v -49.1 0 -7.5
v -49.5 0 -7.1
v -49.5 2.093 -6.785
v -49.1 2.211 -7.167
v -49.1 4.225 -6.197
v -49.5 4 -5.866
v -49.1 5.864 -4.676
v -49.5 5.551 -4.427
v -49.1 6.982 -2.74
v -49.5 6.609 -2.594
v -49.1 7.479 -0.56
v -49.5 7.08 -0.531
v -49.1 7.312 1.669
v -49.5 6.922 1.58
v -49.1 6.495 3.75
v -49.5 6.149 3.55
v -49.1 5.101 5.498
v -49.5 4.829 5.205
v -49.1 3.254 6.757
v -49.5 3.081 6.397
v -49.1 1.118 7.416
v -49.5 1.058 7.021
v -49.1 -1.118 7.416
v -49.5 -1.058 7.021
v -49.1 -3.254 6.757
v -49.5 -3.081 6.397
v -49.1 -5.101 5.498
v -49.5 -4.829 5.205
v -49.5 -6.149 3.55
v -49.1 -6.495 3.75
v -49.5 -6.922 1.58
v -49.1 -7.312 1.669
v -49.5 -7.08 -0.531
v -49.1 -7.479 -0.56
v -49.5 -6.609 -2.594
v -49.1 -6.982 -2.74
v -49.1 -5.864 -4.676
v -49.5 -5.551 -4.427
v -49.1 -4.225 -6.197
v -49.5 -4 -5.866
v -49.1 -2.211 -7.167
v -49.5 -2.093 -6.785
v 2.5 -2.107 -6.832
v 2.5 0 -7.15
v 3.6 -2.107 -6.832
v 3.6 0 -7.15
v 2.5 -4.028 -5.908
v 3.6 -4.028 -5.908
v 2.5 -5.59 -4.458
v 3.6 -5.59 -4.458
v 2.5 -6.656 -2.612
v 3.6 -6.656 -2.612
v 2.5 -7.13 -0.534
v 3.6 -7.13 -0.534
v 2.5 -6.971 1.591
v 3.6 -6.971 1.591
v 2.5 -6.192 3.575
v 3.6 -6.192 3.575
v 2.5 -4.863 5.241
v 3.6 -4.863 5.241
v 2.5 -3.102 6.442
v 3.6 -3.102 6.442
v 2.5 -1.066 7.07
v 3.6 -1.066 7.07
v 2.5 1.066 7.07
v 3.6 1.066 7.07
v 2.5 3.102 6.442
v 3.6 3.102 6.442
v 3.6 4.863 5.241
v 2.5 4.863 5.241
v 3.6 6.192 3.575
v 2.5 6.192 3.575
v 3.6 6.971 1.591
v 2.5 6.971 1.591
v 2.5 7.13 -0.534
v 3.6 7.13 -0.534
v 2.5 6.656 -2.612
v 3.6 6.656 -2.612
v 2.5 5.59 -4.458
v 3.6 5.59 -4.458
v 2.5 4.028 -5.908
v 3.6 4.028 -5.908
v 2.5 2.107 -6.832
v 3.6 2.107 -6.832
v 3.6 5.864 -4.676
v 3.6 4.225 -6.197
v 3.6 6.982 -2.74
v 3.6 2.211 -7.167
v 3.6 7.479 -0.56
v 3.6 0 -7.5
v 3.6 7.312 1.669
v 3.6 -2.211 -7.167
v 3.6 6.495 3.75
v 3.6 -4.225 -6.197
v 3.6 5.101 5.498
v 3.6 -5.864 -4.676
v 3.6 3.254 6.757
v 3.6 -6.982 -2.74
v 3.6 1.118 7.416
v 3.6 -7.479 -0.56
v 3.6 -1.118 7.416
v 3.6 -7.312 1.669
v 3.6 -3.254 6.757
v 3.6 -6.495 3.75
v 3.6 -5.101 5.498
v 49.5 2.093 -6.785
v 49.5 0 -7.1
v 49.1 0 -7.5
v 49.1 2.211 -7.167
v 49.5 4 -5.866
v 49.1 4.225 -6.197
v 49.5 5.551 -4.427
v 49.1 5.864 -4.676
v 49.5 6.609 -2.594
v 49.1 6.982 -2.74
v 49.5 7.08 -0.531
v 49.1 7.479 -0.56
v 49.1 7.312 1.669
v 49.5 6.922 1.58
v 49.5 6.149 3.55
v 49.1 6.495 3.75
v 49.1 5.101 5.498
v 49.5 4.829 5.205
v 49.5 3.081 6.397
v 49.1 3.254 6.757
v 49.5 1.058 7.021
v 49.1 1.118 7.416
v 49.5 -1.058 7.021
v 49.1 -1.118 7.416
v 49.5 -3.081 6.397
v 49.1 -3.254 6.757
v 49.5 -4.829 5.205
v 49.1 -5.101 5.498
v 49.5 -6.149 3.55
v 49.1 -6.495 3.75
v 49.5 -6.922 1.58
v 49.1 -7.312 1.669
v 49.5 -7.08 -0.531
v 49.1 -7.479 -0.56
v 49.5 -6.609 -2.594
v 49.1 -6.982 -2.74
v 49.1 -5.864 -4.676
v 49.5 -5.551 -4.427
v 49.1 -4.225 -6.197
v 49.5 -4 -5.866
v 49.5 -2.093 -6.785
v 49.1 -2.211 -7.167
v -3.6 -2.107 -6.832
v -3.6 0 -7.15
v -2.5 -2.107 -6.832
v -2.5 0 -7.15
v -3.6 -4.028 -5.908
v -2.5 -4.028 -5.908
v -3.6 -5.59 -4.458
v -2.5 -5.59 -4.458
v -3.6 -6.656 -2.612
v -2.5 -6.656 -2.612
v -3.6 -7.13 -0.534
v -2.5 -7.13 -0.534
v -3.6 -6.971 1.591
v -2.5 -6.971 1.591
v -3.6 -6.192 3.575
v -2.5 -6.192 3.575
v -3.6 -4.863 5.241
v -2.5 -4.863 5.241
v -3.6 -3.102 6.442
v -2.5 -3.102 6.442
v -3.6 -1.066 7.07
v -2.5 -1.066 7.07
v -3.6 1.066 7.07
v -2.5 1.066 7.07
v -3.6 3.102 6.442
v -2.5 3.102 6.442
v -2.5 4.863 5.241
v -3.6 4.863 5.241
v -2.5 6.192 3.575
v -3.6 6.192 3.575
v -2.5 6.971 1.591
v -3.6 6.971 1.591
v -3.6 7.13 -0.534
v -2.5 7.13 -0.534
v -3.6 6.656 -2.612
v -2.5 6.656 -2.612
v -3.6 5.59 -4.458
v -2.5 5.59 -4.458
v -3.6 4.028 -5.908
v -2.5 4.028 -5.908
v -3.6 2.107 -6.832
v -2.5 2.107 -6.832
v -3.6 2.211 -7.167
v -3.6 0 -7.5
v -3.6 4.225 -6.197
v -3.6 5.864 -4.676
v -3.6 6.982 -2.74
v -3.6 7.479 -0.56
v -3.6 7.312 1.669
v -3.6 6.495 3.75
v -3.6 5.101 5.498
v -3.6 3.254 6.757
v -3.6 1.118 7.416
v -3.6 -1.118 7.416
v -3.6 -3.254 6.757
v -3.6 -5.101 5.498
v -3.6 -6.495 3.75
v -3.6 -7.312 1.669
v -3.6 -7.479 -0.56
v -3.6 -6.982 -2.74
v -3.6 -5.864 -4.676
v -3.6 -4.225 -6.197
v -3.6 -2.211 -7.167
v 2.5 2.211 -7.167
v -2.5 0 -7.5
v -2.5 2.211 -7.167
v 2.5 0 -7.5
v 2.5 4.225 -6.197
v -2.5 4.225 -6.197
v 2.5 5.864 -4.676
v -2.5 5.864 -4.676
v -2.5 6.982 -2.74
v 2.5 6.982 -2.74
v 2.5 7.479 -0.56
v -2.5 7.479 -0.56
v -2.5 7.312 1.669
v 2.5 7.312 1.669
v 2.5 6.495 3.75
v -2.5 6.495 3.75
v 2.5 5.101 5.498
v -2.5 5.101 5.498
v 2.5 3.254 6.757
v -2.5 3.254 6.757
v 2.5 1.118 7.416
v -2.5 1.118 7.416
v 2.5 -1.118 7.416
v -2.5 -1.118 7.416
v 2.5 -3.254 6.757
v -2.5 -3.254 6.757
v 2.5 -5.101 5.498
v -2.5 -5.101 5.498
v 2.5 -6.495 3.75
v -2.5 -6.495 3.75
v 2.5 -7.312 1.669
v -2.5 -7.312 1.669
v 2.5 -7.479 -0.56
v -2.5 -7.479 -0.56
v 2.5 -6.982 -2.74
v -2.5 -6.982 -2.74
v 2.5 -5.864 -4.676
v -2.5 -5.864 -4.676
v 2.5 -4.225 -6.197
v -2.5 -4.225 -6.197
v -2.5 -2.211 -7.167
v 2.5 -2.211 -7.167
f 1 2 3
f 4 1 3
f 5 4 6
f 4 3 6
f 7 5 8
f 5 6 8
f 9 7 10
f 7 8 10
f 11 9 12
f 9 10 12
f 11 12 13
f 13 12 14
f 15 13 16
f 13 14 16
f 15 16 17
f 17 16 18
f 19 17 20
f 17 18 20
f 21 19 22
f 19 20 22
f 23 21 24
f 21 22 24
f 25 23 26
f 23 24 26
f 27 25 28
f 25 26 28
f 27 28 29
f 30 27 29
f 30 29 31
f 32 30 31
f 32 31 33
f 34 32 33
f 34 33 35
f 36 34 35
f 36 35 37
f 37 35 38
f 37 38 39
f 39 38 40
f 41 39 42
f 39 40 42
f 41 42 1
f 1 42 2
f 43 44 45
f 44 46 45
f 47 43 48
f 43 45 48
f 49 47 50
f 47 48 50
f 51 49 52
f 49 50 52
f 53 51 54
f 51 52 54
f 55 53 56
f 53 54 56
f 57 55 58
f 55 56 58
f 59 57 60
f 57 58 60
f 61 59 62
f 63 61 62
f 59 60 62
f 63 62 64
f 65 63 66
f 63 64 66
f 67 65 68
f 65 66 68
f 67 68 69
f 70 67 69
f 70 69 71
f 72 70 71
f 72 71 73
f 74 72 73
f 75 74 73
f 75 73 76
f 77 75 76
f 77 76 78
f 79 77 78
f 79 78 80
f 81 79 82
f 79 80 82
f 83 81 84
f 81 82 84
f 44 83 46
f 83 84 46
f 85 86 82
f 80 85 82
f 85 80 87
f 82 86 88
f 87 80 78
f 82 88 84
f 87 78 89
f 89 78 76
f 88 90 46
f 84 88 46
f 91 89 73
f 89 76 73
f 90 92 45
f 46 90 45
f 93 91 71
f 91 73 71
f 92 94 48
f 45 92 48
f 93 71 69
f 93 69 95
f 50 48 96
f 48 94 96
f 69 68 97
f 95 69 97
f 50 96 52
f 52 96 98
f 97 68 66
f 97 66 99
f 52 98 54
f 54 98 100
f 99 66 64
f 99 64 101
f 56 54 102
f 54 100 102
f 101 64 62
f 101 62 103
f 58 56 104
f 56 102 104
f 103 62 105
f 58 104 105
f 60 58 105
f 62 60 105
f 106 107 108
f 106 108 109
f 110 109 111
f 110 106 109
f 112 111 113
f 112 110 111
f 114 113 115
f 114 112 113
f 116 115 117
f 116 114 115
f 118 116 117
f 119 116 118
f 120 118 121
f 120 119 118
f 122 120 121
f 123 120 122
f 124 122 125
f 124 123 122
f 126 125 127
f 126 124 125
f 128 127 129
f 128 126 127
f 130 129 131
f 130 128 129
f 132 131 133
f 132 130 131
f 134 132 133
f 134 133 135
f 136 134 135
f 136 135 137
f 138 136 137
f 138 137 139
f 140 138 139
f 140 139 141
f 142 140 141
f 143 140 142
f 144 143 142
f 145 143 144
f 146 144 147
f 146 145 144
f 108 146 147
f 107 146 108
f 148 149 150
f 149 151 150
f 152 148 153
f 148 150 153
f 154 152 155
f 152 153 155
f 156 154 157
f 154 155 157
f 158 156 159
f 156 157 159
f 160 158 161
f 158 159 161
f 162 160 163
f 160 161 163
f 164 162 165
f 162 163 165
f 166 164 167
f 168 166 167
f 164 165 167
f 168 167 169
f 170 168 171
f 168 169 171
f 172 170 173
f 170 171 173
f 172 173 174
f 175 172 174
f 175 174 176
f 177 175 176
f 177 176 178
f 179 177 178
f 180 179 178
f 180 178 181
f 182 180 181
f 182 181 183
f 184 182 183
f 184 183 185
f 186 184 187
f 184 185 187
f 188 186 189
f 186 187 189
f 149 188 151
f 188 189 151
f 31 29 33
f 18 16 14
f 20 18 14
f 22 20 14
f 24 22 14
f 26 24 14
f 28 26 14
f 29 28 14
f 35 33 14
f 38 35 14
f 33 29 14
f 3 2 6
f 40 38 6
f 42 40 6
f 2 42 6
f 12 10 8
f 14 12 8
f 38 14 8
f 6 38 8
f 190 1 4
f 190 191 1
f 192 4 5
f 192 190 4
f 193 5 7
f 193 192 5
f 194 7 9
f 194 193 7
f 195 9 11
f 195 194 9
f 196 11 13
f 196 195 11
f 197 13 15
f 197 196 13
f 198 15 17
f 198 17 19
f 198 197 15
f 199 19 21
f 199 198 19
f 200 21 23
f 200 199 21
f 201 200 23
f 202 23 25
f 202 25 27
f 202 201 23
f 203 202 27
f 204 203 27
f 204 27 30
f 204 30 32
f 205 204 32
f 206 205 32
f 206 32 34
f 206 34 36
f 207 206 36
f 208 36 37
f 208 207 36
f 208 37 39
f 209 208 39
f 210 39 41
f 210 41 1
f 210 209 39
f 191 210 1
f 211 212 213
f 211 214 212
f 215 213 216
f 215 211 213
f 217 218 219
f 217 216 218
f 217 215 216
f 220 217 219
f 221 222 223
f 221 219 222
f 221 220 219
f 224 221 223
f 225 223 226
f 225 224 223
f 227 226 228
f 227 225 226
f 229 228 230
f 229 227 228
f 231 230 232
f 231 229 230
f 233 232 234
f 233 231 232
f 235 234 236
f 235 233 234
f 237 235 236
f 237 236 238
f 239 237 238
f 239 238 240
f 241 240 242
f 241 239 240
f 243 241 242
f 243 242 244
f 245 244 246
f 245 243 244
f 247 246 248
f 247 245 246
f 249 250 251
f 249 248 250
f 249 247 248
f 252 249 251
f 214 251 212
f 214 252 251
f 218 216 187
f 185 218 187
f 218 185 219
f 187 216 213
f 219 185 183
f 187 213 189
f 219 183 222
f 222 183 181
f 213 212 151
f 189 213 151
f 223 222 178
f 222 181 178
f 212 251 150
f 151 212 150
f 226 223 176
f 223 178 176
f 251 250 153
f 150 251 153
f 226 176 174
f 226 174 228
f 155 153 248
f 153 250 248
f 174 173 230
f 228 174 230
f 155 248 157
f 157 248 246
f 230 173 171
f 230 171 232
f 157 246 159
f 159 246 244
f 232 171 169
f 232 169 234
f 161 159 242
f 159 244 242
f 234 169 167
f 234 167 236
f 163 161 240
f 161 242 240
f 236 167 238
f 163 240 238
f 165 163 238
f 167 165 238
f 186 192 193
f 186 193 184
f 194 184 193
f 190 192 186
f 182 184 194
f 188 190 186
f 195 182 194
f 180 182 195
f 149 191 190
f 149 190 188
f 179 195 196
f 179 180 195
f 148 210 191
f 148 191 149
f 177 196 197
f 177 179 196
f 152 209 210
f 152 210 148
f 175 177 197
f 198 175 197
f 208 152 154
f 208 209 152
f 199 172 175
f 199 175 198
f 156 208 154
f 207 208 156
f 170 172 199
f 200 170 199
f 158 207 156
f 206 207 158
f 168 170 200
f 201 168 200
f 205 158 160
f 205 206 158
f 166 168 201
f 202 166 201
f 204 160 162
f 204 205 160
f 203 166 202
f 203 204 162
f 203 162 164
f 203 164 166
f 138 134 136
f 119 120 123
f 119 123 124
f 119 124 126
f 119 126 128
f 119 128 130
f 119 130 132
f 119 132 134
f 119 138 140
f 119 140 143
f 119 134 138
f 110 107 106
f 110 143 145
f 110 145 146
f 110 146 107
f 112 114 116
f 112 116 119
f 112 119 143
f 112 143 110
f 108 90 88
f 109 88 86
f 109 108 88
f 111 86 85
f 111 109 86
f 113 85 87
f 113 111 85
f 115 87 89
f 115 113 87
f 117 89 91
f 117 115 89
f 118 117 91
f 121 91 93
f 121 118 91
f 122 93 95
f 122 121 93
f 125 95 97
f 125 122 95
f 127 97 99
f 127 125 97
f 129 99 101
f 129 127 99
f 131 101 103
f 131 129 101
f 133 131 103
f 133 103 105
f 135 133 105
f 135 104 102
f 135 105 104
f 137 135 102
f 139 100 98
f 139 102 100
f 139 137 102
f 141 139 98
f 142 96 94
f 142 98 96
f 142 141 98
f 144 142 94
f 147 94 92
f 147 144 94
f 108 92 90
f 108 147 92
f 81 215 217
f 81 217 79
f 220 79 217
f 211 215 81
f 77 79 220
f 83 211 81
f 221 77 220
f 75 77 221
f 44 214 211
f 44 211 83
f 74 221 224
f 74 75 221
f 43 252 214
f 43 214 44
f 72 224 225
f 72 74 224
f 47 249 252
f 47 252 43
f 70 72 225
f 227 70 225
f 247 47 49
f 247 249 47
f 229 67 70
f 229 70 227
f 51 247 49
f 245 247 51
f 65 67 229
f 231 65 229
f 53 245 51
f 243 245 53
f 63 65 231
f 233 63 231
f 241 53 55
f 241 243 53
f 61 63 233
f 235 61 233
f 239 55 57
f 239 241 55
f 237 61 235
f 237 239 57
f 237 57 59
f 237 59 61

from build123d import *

# Parameters (mm, degrees)
SKETCH1_R           = 7.5
BOSS_EXTRUDE1_DEPTH = 49.5
CHAMFER1_SIZE       = 0.4
SKETCH2_W           = 1.1
SKETCH2_H           = 0.35


with BuildPart() as part:
    # Sketch1 → Boss-Extrude1 (new, symmetric)
    with BuildSketch(Plane(origin=(0, 0, 0), x_dir=(0, 0, -1), z_dir=(1, 0, 0))):
        Circle(SKETCH1_R)
    extrude(amount=BOSS_EXTRUDE1_DEPTH, both=True)

    # Chamfer1
    chamfer1_edges = [part.edges().sort_by_distance(p)[0] for p in [
        (-49.5, 0, 7.5),
        (49.5, 0, 7.5),
    ]]
    chamfer(chamfer1_edges, length=CHAMFER1_SIZE)

    # Sketch2 → Cut-Revolve1 (revolve, cut)
    with BuildSketch(Plane.XY, mode=Mode.PRIVATE) as cut_revolve1_sk:
        with Locations((-3.05, 7.325)):
            Rectangle(SKETCH2_W, SKETCH2_H)
        with Locations((3.05, 7.325)):
            Rectangle(SKETCH2_W, SKETCH2_H)
    revolve(cut_revolve1_sk.sketch.rotate(Axis((0, 0, 0), (-1, 0, 0)), 90), axis=Axis((0, 0, 0), (-1, 0, 0)), mode=Mode.SUBTRACT)


solid = part.part
